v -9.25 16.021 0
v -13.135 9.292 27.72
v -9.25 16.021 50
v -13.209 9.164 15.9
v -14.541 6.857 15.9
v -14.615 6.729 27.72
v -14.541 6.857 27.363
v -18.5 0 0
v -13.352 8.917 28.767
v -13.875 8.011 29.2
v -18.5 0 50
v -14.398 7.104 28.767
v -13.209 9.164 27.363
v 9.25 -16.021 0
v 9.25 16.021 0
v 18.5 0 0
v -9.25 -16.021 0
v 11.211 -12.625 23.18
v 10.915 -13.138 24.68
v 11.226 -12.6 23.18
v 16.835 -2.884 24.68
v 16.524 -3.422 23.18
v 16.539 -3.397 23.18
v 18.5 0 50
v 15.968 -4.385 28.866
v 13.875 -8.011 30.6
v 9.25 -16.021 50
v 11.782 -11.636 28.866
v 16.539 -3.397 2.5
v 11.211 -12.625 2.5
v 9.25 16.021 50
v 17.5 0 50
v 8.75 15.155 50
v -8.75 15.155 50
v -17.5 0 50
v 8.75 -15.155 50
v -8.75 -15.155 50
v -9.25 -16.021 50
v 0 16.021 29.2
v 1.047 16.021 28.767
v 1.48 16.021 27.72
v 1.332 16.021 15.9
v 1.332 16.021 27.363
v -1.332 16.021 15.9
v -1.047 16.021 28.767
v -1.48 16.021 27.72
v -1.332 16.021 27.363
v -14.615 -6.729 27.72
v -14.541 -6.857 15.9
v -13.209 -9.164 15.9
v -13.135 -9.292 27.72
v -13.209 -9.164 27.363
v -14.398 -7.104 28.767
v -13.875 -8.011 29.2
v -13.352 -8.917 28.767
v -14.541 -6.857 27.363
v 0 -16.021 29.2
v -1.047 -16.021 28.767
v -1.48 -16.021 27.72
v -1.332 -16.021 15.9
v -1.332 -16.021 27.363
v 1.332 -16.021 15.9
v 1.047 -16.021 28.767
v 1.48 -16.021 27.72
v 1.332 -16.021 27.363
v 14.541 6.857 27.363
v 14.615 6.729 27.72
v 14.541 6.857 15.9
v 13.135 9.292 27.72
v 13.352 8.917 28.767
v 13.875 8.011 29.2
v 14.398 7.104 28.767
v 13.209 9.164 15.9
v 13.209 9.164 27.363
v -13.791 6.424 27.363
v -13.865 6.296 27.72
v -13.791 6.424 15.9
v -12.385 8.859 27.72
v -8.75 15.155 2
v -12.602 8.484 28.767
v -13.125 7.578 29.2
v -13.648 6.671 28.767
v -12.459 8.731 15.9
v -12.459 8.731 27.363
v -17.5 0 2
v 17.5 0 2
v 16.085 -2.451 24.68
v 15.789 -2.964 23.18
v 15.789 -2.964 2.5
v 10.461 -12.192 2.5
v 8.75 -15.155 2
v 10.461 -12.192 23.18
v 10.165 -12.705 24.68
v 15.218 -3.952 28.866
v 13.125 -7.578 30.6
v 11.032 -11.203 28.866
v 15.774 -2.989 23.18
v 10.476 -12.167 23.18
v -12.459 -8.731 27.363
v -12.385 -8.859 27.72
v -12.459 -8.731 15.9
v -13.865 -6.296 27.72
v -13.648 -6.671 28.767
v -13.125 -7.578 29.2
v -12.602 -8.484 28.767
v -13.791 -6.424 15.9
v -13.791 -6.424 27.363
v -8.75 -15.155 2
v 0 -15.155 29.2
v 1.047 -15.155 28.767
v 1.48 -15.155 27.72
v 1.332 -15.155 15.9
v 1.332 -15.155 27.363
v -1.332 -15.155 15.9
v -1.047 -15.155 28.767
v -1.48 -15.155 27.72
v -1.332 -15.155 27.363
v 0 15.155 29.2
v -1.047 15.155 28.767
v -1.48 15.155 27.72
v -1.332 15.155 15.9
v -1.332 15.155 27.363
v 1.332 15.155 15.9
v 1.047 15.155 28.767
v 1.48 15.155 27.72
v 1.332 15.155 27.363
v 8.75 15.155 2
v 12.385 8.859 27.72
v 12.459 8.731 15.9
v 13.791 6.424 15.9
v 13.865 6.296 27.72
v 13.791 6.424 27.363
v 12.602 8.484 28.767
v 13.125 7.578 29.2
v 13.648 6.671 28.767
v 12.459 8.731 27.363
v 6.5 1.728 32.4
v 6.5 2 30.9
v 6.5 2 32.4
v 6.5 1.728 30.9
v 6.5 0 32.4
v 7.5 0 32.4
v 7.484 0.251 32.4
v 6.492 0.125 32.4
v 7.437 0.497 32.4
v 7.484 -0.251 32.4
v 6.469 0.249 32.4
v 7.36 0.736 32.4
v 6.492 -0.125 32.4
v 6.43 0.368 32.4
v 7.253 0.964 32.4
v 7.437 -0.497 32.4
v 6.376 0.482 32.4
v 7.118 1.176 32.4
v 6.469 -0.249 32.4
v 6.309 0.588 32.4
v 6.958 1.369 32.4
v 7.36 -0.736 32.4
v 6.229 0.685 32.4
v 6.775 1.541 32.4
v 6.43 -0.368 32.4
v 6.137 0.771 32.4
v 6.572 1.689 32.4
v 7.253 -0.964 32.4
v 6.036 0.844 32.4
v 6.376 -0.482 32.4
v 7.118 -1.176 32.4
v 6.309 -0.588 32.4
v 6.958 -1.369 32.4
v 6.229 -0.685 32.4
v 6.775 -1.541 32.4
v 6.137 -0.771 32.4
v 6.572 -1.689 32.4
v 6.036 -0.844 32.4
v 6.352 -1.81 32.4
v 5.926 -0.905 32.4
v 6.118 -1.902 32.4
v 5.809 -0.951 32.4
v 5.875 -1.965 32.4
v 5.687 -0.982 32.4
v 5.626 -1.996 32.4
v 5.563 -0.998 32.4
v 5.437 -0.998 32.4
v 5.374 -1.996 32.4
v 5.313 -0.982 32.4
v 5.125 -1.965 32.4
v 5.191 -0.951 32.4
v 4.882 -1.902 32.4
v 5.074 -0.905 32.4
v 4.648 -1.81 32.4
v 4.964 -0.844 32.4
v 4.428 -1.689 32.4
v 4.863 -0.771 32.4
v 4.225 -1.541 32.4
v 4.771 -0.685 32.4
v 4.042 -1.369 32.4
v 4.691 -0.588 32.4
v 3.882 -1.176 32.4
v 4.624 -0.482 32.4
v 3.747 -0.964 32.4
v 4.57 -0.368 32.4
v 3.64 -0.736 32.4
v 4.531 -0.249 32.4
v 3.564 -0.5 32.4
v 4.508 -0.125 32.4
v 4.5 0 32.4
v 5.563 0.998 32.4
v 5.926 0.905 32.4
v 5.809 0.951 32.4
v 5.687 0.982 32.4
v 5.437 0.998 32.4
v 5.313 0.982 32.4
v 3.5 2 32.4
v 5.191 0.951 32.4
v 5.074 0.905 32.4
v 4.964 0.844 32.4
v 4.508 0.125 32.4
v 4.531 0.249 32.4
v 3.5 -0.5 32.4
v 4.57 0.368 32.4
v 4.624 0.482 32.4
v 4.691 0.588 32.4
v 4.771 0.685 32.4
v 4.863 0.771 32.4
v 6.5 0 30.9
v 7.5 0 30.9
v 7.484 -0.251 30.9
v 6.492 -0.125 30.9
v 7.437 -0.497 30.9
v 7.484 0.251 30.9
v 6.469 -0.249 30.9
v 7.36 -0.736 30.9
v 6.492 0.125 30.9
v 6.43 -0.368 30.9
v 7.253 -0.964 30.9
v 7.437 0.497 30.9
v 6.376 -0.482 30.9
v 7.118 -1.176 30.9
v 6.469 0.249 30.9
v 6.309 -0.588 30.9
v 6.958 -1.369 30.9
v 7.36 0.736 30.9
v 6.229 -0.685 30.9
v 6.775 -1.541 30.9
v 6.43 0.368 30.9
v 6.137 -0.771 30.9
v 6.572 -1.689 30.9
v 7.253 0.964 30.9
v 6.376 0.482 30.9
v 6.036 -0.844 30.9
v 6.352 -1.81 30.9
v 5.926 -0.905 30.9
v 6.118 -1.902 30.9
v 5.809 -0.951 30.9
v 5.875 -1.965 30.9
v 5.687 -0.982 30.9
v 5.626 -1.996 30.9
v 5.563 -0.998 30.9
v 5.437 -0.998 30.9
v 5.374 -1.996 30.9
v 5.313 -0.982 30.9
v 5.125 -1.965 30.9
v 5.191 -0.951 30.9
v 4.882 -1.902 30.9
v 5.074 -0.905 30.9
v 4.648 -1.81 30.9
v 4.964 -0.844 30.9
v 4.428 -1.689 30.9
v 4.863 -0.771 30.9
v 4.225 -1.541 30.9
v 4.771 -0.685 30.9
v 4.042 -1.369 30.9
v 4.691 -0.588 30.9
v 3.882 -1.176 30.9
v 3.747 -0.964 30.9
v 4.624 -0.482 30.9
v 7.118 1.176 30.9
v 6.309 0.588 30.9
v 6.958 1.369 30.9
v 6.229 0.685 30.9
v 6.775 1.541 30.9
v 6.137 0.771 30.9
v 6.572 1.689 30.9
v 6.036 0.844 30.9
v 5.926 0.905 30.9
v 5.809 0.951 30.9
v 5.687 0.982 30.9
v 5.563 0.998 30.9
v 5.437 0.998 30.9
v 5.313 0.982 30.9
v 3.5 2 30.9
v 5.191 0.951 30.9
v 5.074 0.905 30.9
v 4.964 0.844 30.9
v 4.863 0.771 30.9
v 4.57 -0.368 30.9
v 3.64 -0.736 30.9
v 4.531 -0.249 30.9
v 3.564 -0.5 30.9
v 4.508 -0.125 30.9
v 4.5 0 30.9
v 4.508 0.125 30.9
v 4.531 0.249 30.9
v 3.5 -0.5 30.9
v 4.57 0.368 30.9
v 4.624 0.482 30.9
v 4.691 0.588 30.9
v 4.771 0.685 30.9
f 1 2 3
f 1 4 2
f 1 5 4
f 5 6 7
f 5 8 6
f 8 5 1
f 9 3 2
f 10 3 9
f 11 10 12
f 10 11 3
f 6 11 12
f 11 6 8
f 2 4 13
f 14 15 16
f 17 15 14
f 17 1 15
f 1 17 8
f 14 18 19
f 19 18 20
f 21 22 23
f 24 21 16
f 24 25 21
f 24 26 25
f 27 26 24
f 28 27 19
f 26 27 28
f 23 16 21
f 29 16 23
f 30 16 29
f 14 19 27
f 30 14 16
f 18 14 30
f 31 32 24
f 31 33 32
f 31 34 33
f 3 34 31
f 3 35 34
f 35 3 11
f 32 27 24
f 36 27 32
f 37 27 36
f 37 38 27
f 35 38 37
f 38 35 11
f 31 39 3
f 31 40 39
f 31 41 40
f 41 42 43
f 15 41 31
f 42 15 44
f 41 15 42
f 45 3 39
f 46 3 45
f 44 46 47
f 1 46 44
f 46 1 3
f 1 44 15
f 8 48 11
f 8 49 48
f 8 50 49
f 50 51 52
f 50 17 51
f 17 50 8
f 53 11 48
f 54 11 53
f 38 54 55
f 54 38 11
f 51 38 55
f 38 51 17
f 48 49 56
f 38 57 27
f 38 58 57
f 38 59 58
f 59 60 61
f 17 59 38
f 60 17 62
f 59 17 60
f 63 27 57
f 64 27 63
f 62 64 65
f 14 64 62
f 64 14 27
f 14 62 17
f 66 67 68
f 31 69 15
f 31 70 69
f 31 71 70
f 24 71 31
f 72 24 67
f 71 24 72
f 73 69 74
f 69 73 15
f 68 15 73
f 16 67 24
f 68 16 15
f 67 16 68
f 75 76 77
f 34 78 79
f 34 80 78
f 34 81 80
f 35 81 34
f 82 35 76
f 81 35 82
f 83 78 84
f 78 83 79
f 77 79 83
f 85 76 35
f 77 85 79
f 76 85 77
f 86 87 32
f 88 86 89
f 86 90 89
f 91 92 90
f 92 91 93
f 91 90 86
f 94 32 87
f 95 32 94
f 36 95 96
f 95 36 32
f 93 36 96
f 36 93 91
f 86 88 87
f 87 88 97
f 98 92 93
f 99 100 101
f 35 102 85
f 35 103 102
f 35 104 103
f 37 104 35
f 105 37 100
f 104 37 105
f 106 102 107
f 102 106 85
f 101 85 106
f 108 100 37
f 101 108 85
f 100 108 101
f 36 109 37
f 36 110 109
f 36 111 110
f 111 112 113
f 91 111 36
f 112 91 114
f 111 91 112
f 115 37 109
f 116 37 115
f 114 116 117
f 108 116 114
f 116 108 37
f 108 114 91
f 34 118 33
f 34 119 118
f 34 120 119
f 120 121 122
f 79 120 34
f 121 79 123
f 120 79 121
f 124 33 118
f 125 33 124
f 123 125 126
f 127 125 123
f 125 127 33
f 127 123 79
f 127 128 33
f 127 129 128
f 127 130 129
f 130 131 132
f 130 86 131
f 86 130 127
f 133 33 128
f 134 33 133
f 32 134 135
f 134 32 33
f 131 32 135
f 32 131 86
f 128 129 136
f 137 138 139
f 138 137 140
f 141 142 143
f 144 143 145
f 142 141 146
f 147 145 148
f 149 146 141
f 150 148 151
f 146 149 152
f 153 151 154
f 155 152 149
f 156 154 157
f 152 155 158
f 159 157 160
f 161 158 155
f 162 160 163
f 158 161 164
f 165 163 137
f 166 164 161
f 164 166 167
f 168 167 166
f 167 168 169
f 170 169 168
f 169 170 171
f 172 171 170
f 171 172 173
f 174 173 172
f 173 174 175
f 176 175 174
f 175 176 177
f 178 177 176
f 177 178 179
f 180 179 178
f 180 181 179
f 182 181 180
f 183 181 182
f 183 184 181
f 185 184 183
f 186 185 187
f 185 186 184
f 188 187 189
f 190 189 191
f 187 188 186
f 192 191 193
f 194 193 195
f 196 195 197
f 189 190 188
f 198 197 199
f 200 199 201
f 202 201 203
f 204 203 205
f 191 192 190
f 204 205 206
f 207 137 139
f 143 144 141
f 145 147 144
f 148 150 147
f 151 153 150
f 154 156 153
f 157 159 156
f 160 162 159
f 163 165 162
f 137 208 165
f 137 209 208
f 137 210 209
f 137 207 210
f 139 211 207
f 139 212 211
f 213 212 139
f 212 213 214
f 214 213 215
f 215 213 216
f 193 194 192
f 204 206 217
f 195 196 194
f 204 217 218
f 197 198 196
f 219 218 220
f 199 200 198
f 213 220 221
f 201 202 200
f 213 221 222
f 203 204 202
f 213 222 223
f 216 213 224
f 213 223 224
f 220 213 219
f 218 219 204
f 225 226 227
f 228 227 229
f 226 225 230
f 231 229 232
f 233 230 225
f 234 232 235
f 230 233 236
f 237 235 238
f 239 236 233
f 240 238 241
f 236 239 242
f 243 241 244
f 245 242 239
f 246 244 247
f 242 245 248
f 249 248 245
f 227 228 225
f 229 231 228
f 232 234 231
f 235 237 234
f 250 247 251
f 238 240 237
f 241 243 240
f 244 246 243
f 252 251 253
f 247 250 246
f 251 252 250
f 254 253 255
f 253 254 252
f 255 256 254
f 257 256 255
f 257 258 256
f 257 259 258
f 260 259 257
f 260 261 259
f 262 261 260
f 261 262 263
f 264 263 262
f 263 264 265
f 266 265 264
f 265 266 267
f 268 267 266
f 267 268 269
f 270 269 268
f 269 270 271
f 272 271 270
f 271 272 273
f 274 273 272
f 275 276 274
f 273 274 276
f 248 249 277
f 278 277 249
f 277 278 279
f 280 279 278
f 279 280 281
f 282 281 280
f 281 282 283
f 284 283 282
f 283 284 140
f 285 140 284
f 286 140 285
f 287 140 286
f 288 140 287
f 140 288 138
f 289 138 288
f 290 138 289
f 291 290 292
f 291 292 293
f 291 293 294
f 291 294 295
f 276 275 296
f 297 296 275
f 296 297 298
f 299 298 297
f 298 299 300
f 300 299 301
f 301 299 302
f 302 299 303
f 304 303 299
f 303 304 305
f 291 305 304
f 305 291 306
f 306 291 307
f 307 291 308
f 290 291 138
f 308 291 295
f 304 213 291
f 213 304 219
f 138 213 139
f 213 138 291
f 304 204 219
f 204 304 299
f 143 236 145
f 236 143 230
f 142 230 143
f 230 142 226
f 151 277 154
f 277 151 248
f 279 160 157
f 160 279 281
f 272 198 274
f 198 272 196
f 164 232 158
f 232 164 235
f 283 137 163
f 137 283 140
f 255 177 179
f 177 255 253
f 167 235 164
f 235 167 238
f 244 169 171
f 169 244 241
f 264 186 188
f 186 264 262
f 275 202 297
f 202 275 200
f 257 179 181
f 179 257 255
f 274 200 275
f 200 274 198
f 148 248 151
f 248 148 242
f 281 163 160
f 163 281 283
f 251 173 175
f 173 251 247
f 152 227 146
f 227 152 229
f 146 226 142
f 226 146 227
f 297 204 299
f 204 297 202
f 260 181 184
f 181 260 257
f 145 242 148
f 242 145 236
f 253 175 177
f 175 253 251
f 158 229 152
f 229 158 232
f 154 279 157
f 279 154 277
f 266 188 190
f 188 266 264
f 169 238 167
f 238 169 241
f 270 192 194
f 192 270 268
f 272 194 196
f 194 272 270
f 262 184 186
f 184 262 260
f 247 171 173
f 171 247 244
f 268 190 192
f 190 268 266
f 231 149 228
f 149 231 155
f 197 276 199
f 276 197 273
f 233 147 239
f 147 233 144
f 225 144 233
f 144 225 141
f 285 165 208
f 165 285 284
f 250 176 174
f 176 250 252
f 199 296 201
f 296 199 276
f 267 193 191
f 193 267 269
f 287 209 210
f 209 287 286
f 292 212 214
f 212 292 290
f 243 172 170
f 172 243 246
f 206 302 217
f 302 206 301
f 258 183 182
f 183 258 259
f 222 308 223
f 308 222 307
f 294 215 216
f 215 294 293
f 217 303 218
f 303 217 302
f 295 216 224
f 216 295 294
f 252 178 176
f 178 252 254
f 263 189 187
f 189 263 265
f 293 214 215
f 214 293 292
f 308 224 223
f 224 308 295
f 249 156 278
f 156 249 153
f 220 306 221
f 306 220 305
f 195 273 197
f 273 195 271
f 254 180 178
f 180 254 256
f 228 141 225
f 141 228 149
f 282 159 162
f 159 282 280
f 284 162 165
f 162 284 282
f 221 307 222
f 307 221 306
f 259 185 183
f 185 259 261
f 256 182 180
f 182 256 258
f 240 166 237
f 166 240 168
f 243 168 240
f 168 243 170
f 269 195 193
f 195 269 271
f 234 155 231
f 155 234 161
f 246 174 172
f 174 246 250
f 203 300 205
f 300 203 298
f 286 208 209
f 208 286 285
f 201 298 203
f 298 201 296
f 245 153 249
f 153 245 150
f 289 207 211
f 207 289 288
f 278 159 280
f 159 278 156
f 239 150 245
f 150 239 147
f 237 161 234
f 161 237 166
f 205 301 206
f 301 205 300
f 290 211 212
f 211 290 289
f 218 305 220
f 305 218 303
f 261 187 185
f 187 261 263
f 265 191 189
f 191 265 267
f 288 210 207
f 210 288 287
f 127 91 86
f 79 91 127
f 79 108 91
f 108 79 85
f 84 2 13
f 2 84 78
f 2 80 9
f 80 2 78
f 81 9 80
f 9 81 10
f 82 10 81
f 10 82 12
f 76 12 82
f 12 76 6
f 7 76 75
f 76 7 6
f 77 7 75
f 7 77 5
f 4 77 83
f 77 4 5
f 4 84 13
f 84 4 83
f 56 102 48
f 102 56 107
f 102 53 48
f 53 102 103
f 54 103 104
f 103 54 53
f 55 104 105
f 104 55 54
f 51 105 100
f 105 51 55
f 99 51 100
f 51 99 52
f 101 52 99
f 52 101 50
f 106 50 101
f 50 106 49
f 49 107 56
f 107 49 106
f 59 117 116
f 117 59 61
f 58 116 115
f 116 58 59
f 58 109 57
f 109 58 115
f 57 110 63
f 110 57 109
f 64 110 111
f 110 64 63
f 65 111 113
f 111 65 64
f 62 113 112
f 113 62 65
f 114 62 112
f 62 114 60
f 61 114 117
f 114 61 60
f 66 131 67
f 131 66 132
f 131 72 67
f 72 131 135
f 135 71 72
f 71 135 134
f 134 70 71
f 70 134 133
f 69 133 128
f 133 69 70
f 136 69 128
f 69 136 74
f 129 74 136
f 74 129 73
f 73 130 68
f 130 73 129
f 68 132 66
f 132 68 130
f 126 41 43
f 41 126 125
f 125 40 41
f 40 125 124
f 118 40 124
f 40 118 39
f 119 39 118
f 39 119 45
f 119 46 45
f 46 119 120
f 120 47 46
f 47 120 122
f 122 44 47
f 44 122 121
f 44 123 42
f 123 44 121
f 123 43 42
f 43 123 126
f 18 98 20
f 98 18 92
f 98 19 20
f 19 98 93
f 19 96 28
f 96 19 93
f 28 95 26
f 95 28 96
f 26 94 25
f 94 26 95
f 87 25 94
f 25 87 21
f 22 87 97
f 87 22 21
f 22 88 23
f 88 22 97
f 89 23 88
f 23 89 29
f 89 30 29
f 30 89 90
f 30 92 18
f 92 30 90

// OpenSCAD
use <MCAD/regular_shapes.scad>

// Setup
// höhe, seite, array durchgänge, array tore
hoehe = 50;
radius = 18.5;
seite = 18.5;
tore = [4];
durchgaenge = [];

// Berechnete größen

sideRad = seite * sqrt(3)/2;


module move(x=0,y=0,z=0,rx=0,ry=0,rz=0)
{ translate([x,y,z])rotate([rx,ry,rz]) children(); }

module wallmove(x=0, y=0, z=0, seite=0) {
  rotate([0,0,seite*60]) translate([x,y,z]) children();
}

function flatten(l) = [ for (a = l) for (b = a) b ] ;

turm();
/* move(30,sideRad+10,1, 0, 0, 0) zinnenkranz();
turm(); */

module turm() {
  difference() {
    // turmkörper
    union() {
      hexagon_tube(hoehe, radius, 1);
      hexagon_prism(2,radius);
      for (i = tore) {
        //wallmove(0, sideRad-.1, 0, i)
        //tor();
        wallmove(x=-seite, i) #drehtorangeln();
      }
        mauerstruktur();
    }
    for (i = flatten([durchgaenge, tore])) {
      wallmove(0, sideRad-2, 1, i)
       toroeffnung();
    }
    for (i = [1:6]) {
      wallmove(0, sideRad-2, 7, i)
       fenster();
    }
    //move(0,0,1) cylinder_tube(5, sideRad-2, radius);
  }
}

module zinnenkranz() {
move(0, 0, -1)
  difference() {
    union() {
    difference() {
      translate([0,0,0]) hexagon_tube(7,radius +3.5,2);
        zinnen();
    }
    move(0,0,3) hexagon_prism(1, radius +1.5);
    move(0,0,0) hexagon_prism(3, radius -1.2);
    }
    for(i = durchgaenge) {
    rotate([0,0,i*60]) translate([0, sideRad+2.2, 4]) cube([radius*2,4,radius +1.5], center = true);
    }
  }
}

module tor() {
  torbreit = seite;
  torhoch = torbreit*1.8;
  color("Green") {
    move(0,0, torhoch/2) cube([torbreit, 1.2, torhoch], center = true);
    move(0,1, torhoch/2) difference() {
      cube([torbreit, 1.5, torhoch], center=true);
      move(0,0,2) cube([torbreit-3, 1, torhoch + 3], center=true);
    }
  }
}

module toroeffnung() {
  $fn = 8;
  torbreit = seite - seite/5;
  torhoch = hoehe/3 - (hoehe/30);
  rundungdm = torbreit/2 -torbreit/10;
  //
  translate([0,5,rundungdm*4]) {
    union() {
      rotate([90,0,0]) {
        linear_extrude(6) {
          circle(rundungdm);
          move(0, -rundungdm*2) square([rundungdm*1.8, (rundungdm*4)-3], center=true);
        }
      }
    }
  }
}

module fenster() {
  $fn = 8;
  fensterbreit = seite/5;
  fensterhoch = hoehe;
  fensterdm = fensterbreit/2 -fensterbreit/10;
  //
  translate([0,5,fensterdm*14]) {
    union() {
      rotate([90,0,0]) {
        linear_extrude(6) {
          circle(fensterdm);
          move(0, -fensterdm*4) square([fensterdm*1.8, (fensterdm*10)-3], center=true);
        }
      }
    }
  }

}

module mauerstruktur() {
  for (i = [1:6]) {
    move(rz=i*60)
    move(x=-sideRad/2-.5,y=-sideRad+0.1, rx=90) {
        scale([radius / 72, (hoehe-2) / 108, 0.9/ 256])
        surface(file = "mauer2.png", convexity = 3);
    }
  }
}


module solomauer() {
  cube([seite, 1, hoehe]);
  move(x=0,y=0, rx=90) {
    scale([radius / 72, (hoehe-2) / 108, 0.9/ 256])
    surface(file = "mauer2.png", convexity = 3);
  }
}


module zinnen() {
  zinB = seite/6;
  zinVers = seite/6 * 1.8;
  echo(zinB);
  for (i = [1:6]) {
    rotate([0,0,i*60]) {
      color("Blue") {
        translate([0, sideRad, 7]) {
          translate([-zinVers,0,0]) cube([zinB,7,5], center= true);
          translate([0,0,0]) cube([zinB,7,5], center= true);
          translate([zinVers,0,0]) cube([zinB,7,5], center= true);
        }
      }
    }
  }
}

module drehtor() {
  $fn = 50;
  torbreit = seite-1;
  torhoch = torbreit*1.8;
  intersection() {
    union() {
      cube([torbreit-3.5, 1, torhoch]);
      move(rx=90) scale([torbreit / 512, (torhoch) / 512, 0.9/ 256])
      surface(file = "holz.png", convexity = 3);
    }
    move(x=seite/2-1,y=-3) scale(v=[1.2,1.2,1]) toroeffnung();
  }
  move(x=torbreit-3.5, z=1.5) cube([2,1,torhoch-3.2]);
  move(x=torbreit-1.5, y=-1, z=torhoch/2)
  difference() {
  cylinder(torhoch-3.2, r=2, center=true);
  cylinder(torhoch*2, r=.9, center = true);
  }
}

module drehtorangeln() {
  $fn = 50;
  torbreit = seite-1;
  torhoch = torbreit*1.8;
  move(rz=0) {
    difference() {
      union() {
        move(x=-0.5, y=-.5) cube([3,2.5,1.5]);
        move(x=1.5) cylinder(1.5, r=2);
        move(x=-0.5,y=-.5, z=torhoch-.6) cube([3,2.5,1.5]);
        move(x=1.5, z=torhoch-.6) cylinder(1.5, r=2);
      }
      move(x=1.5, z=0.2) cylinder(torhoch * 2, r=1);
    }
  }

}
